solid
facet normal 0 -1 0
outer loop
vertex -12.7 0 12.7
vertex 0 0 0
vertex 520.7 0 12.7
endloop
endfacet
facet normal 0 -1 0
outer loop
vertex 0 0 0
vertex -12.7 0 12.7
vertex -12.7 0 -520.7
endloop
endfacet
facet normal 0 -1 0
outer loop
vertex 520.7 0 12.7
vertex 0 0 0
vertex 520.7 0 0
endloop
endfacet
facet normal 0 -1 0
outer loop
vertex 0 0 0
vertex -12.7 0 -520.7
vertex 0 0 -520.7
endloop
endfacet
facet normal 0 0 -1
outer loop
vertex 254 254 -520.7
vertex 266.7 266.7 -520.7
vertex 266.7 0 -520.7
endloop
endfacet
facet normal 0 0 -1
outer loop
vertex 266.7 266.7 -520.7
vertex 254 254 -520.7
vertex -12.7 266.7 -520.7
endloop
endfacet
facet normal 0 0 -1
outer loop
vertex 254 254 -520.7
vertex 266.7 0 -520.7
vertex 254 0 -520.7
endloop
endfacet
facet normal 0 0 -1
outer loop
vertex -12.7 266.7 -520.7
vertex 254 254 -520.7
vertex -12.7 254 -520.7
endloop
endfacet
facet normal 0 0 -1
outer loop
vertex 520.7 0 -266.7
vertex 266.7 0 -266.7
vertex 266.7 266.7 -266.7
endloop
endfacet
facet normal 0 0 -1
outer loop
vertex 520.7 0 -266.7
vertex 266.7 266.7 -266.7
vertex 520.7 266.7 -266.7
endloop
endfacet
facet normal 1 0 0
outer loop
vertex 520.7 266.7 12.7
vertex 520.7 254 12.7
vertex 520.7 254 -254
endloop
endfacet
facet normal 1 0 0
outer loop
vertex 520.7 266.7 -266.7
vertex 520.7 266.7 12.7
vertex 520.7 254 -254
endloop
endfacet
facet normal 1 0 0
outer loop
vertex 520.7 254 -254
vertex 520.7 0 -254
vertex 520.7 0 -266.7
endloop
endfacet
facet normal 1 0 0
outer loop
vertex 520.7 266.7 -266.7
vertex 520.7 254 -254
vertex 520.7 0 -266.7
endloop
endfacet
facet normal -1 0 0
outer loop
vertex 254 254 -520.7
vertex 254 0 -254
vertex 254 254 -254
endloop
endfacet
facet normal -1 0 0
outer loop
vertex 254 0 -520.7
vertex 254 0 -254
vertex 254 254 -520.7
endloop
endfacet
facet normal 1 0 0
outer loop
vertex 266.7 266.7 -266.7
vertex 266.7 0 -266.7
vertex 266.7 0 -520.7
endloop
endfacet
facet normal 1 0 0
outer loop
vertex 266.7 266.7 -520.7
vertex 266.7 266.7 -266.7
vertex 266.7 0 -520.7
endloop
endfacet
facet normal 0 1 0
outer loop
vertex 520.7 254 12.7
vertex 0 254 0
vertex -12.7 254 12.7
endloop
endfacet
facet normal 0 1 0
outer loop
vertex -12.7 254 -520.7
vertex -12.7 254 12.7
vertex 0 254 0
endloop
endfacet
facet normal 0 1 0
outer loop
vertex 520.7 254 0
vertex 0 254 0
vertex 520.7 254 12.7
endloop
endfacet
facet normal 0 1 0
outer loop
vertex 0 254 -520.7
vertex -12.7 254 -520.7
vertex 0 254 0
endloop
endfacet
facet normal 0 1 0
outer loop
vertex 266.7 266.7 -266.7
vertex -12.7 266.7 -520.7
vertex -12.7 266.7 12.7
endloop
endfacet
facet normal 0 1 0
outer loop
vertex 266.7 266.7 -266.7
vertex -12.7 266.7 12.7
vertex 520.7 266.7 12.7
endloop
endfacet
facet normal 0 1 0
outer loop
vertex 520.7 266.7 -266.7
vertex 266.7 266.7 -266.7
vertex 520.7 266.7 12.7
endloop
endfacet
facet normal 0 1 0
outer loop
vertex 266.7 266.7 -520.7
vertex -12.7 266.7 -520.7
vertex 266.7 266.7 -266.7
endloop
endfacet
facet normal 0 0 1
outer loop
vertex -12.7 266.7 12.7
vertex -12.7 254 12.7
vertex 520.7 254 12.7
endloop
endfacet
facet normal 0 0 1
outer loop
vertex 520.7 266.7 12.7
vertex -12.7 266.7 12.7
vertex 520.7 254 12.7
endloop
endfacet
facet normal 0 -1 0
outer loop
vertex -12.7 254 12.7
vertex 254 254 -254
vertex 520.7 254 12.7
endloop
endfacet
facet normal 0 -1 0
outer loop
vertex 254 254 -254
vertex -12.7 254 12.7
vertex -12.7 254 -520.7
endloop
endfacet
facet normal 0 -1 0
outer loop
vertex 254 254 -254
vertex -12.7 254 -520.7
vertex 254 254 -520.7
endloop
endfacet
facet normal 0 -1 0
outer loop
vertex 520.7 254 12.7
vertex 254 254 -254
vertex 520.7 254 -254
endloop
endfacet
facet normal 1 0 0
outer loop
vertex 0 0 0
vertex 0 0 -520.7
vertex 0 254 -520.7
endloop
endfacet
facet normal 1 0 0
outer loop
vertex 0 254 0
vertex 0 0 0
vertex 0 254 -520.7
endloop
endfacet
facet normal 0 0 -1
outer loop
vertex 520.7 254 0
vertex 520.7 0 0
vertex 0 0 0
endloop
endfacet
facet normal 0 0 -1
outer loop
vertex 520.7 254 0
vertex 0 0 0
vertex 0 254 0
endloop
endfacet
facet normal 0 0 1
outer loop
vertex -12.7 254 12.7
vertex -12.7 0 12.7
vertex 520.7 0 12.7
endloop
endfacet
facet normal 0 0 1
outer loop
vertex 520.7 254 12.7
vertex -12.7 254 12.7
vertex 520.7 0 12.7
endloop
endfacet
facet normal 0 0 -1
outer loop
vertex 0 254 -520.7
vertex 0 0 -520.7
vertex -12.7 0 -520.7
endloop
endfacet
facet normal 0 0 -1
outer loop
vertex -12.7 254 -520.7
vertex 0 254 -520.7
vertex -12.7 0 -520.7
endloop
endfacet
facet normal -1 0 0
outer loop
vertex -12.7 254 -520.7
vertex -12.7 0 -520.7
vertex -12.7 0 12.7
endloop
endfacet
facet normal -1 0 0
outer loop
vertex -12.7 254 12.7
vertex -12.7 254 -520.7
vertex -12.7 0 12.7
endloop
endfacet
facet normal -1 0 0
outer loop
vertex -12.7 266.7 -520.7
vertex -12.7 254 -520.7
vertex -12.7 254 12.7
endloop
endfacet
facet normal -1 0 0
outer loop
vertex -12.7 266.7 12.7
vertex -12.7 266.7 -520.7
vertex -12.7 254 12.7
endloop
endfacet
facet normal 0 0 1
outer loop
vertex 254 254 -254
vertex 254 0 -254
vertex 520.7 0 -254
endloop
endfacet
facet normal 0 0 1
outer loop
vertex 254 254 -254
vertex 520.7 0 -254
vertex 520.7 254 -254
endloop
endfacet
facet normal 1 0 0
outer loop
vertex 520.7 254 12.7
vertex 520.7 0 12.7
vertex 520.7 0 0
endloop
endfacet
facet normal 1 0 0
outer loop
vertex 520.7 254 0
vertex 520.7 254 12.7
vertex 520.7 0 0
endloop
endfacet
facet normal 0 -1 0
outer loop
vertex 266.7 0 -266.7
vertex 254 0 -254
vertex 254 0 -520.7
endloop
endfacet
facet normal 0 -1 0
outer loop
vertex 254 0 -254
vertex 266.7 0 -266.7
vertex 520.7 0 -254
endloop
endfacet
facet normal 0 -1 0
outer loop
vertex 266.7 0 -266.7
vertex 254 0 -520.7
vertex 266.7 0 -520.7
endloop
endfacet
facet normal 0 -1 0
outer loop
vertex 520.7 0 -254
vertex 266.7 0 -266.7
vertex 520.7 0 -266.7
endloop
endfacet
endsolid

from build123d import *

# Parameters (mm, degrees)
BOSS_EXTRUDE1_DEPTH = 254
SKETCH2_W           = 254
SKETCH2_H           = 254
CUT_EXTRUDE1_DEPTH  = 254
SKETCH3_W           = 254
SKETCH3_H           = 254
CUT_EXTRUDE2_DEPTH  = 254
SKETCH4_W           = 254
SKETCH4_H           = 266.7
SKETCH4_H_2         = 12.7
BOSS_EXTRUDE2_DEPTH = 12.7


with BuildPart() as part:
    # Sketch1 → Boss-Extrude1 (new body)
    with BuildSketch(Plane(origin=(0, 0, 0), x_dir=(1, 0, 0), z_dir=(0, 1, 0))):
        Polygon((-12.7, -12.7), (520.7, -12.7), (520.7, 266.7), (266.7, 266.7), (266.7, 520.7), (-12.7, 520.7), align=None)
        Polygon((0, 0), (508, 0), (508, 254), (254, 254), (254, 508), (0, 508), align=None, mode=Mode.SUBTRACT)
    extrude(amount=BOSS_EXTRUDE1_DEPTH)

    # Sketch2 → Cut-Extrude1 (cut)
    with BuildSketch(Plane.ZY.offset(-508)):
        with Locations((-127, 127)):
            Rectangle(SKETCH2_W, SKETCH2_H)
    extrude(amount=-CUT_EXTRUDE1_DEPTH, mode=Mode.SUBTRACT)

    # Sketch3 → Cut-Extrude2 (cut)
    with BuildSketch(Plane.XY.offset(-508)):
        with Locations((127, 127)):
            Rectangle(SKETCH3_W, SKETCH3_H)
    extrude(amount=-CUT_EXTRUDE2_DEPTH, mode=Mode.SUBTRACT)


with BuildPart() as cut_extrude2_piece_1:
    # of the separate pieces the step leaves, piece 1, a body of its own (cut_extrude2_pieces)
    add(part.part.solids().sort_by_distance((-12.7, 0, 12.7))[0])


with BuildPart() as cut_extrude2_piece_2:
    # of the separate pieces the step leaves, piece 2, a body of its own (cut_extrude2_pieces)
    add(part.part.solids().sort_by_distance((266.7, 0, -520.7))[0])

    # Sketch4 → Boss-Extrude2 (add)
    with BuildSketch(Plane(origin=(0, 254, 0), x_dir=(1, 0, 0), z_dir=(0, 1, 0))):
        Polygon((266.7, 520.7), (0, 520.7), (0, 0), (266.7, 0), (266.7, 266.7), align=None)
        with Locations((393.7, 133.35)):
            Rectangle(SKETCH4_W, SKETCH4_H)
        Polygon((0, 520.7), (-12.7, 520.7), (-12.7, -12.7), (266.7, -12.7), (266.7, 0), (0, 0), align=None)
        with Locations((393.7, -6.35)):
            Rectangle(SKETCH4_W, SKETCH4_H_2)
    extrude(amount=BOSS_EXTRUDE2_DEPTH)


solid = Compound([cut_extrude2_piece_1.part, cut_extrude2_piece_2.part])
